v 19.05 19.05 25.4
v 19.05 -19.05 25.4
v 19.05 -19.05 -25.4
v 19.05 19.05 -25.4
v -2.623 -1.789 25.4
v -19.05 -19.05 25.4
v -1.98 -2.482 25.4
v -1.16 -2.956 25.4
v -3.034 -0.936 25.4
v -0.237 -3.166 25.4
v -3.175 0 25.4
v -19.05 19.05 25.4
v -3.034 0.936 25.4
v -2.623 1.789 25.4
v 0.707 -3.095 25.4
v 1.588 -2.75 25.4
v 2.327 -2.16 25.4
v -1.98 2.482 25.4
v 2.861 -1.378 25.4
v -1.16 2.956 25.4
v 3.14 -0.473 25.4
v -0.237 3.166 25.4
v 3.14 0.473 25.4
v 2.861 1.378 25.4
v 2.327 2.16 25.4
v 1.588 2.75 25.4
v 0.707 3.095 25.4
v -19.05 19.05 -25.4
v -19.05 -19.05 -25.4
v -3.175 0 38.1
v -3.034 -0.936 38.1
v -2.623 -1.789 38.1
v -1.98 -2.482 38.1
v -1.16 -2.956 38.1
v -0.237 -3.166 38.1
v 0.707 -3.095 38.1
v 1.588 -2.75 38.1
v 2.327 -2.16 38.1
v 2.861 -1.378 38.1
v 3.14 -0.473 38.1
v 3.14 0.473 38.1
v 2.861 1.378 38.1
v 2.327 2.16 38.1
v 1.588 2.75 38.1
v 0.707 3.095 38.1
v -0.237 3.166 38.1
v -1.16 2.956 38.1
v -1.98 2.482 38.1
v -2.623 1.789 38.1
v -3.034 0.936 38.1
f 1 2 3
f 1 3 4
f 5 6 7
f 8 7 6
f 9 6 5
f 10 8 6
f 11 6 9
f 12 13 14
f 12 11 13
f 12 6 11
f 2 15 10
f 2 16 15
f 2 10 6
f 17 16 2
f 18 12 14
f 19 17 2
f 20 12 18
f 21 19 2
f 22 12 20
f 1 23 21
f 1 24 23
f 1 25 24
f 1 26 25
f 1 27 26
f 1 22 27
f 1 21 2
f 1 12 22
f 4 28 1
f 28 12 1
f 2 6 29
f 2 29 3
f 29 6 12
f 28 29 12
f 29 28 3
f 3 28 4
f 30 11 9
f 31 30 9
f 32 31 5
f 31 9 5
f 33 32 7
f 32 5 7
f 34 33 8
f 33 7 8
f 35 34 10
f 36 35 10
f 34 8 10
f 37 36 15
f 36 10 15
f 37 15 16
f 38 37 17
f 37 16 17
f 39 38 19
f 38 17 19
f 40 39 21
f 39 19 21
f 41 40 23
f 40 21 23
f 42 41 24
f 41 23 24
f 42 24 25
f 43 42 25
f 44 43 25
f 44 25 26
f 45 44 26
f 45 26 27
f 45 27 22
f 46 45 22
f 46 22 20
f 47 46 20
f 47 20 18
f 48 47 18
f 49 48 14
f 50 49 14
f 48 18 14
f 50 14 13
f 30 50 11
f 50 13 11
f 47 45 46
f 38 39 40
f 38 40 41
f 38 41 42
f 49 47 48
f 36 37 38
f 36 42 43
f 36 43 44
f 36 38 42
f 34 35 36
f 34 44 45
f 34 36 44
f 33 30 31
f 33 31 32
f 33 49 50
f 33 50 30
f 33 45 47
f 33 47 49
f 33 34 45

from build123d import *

# Parameters (mm, degrees)
SKETCH1_W           = 38.1
SKETCH1_H           = 38.1
BOSS_EXTRUDE1_DEPTH = 25.4
SKETCH2_R           = 3.175
BOSS_EXTRUDE2_DEPTH = 12.7


with BuildPart() as part:
    # Sketch1 → Boss-Extrude1 (new, symmetric)
    with BuildSketch(Plane.XY):
        Rectangle(SKETCH1_W, SKETCH1_H)
    extrude(amount=BOSS_EXTRUDE1_DEPTH, both=True)

    # Sketch2 → Boss-Extrude2 (add)
    with BuildSketch(Plane.XY.offset(25.4)):
        with Locations(Location((0, 0, 0), (0, 0, 180))):
            Circle(SKETCH2_R)
    extrude(amount=BOSS_EXTRUDE2_DEPTH)


solid = part.part
